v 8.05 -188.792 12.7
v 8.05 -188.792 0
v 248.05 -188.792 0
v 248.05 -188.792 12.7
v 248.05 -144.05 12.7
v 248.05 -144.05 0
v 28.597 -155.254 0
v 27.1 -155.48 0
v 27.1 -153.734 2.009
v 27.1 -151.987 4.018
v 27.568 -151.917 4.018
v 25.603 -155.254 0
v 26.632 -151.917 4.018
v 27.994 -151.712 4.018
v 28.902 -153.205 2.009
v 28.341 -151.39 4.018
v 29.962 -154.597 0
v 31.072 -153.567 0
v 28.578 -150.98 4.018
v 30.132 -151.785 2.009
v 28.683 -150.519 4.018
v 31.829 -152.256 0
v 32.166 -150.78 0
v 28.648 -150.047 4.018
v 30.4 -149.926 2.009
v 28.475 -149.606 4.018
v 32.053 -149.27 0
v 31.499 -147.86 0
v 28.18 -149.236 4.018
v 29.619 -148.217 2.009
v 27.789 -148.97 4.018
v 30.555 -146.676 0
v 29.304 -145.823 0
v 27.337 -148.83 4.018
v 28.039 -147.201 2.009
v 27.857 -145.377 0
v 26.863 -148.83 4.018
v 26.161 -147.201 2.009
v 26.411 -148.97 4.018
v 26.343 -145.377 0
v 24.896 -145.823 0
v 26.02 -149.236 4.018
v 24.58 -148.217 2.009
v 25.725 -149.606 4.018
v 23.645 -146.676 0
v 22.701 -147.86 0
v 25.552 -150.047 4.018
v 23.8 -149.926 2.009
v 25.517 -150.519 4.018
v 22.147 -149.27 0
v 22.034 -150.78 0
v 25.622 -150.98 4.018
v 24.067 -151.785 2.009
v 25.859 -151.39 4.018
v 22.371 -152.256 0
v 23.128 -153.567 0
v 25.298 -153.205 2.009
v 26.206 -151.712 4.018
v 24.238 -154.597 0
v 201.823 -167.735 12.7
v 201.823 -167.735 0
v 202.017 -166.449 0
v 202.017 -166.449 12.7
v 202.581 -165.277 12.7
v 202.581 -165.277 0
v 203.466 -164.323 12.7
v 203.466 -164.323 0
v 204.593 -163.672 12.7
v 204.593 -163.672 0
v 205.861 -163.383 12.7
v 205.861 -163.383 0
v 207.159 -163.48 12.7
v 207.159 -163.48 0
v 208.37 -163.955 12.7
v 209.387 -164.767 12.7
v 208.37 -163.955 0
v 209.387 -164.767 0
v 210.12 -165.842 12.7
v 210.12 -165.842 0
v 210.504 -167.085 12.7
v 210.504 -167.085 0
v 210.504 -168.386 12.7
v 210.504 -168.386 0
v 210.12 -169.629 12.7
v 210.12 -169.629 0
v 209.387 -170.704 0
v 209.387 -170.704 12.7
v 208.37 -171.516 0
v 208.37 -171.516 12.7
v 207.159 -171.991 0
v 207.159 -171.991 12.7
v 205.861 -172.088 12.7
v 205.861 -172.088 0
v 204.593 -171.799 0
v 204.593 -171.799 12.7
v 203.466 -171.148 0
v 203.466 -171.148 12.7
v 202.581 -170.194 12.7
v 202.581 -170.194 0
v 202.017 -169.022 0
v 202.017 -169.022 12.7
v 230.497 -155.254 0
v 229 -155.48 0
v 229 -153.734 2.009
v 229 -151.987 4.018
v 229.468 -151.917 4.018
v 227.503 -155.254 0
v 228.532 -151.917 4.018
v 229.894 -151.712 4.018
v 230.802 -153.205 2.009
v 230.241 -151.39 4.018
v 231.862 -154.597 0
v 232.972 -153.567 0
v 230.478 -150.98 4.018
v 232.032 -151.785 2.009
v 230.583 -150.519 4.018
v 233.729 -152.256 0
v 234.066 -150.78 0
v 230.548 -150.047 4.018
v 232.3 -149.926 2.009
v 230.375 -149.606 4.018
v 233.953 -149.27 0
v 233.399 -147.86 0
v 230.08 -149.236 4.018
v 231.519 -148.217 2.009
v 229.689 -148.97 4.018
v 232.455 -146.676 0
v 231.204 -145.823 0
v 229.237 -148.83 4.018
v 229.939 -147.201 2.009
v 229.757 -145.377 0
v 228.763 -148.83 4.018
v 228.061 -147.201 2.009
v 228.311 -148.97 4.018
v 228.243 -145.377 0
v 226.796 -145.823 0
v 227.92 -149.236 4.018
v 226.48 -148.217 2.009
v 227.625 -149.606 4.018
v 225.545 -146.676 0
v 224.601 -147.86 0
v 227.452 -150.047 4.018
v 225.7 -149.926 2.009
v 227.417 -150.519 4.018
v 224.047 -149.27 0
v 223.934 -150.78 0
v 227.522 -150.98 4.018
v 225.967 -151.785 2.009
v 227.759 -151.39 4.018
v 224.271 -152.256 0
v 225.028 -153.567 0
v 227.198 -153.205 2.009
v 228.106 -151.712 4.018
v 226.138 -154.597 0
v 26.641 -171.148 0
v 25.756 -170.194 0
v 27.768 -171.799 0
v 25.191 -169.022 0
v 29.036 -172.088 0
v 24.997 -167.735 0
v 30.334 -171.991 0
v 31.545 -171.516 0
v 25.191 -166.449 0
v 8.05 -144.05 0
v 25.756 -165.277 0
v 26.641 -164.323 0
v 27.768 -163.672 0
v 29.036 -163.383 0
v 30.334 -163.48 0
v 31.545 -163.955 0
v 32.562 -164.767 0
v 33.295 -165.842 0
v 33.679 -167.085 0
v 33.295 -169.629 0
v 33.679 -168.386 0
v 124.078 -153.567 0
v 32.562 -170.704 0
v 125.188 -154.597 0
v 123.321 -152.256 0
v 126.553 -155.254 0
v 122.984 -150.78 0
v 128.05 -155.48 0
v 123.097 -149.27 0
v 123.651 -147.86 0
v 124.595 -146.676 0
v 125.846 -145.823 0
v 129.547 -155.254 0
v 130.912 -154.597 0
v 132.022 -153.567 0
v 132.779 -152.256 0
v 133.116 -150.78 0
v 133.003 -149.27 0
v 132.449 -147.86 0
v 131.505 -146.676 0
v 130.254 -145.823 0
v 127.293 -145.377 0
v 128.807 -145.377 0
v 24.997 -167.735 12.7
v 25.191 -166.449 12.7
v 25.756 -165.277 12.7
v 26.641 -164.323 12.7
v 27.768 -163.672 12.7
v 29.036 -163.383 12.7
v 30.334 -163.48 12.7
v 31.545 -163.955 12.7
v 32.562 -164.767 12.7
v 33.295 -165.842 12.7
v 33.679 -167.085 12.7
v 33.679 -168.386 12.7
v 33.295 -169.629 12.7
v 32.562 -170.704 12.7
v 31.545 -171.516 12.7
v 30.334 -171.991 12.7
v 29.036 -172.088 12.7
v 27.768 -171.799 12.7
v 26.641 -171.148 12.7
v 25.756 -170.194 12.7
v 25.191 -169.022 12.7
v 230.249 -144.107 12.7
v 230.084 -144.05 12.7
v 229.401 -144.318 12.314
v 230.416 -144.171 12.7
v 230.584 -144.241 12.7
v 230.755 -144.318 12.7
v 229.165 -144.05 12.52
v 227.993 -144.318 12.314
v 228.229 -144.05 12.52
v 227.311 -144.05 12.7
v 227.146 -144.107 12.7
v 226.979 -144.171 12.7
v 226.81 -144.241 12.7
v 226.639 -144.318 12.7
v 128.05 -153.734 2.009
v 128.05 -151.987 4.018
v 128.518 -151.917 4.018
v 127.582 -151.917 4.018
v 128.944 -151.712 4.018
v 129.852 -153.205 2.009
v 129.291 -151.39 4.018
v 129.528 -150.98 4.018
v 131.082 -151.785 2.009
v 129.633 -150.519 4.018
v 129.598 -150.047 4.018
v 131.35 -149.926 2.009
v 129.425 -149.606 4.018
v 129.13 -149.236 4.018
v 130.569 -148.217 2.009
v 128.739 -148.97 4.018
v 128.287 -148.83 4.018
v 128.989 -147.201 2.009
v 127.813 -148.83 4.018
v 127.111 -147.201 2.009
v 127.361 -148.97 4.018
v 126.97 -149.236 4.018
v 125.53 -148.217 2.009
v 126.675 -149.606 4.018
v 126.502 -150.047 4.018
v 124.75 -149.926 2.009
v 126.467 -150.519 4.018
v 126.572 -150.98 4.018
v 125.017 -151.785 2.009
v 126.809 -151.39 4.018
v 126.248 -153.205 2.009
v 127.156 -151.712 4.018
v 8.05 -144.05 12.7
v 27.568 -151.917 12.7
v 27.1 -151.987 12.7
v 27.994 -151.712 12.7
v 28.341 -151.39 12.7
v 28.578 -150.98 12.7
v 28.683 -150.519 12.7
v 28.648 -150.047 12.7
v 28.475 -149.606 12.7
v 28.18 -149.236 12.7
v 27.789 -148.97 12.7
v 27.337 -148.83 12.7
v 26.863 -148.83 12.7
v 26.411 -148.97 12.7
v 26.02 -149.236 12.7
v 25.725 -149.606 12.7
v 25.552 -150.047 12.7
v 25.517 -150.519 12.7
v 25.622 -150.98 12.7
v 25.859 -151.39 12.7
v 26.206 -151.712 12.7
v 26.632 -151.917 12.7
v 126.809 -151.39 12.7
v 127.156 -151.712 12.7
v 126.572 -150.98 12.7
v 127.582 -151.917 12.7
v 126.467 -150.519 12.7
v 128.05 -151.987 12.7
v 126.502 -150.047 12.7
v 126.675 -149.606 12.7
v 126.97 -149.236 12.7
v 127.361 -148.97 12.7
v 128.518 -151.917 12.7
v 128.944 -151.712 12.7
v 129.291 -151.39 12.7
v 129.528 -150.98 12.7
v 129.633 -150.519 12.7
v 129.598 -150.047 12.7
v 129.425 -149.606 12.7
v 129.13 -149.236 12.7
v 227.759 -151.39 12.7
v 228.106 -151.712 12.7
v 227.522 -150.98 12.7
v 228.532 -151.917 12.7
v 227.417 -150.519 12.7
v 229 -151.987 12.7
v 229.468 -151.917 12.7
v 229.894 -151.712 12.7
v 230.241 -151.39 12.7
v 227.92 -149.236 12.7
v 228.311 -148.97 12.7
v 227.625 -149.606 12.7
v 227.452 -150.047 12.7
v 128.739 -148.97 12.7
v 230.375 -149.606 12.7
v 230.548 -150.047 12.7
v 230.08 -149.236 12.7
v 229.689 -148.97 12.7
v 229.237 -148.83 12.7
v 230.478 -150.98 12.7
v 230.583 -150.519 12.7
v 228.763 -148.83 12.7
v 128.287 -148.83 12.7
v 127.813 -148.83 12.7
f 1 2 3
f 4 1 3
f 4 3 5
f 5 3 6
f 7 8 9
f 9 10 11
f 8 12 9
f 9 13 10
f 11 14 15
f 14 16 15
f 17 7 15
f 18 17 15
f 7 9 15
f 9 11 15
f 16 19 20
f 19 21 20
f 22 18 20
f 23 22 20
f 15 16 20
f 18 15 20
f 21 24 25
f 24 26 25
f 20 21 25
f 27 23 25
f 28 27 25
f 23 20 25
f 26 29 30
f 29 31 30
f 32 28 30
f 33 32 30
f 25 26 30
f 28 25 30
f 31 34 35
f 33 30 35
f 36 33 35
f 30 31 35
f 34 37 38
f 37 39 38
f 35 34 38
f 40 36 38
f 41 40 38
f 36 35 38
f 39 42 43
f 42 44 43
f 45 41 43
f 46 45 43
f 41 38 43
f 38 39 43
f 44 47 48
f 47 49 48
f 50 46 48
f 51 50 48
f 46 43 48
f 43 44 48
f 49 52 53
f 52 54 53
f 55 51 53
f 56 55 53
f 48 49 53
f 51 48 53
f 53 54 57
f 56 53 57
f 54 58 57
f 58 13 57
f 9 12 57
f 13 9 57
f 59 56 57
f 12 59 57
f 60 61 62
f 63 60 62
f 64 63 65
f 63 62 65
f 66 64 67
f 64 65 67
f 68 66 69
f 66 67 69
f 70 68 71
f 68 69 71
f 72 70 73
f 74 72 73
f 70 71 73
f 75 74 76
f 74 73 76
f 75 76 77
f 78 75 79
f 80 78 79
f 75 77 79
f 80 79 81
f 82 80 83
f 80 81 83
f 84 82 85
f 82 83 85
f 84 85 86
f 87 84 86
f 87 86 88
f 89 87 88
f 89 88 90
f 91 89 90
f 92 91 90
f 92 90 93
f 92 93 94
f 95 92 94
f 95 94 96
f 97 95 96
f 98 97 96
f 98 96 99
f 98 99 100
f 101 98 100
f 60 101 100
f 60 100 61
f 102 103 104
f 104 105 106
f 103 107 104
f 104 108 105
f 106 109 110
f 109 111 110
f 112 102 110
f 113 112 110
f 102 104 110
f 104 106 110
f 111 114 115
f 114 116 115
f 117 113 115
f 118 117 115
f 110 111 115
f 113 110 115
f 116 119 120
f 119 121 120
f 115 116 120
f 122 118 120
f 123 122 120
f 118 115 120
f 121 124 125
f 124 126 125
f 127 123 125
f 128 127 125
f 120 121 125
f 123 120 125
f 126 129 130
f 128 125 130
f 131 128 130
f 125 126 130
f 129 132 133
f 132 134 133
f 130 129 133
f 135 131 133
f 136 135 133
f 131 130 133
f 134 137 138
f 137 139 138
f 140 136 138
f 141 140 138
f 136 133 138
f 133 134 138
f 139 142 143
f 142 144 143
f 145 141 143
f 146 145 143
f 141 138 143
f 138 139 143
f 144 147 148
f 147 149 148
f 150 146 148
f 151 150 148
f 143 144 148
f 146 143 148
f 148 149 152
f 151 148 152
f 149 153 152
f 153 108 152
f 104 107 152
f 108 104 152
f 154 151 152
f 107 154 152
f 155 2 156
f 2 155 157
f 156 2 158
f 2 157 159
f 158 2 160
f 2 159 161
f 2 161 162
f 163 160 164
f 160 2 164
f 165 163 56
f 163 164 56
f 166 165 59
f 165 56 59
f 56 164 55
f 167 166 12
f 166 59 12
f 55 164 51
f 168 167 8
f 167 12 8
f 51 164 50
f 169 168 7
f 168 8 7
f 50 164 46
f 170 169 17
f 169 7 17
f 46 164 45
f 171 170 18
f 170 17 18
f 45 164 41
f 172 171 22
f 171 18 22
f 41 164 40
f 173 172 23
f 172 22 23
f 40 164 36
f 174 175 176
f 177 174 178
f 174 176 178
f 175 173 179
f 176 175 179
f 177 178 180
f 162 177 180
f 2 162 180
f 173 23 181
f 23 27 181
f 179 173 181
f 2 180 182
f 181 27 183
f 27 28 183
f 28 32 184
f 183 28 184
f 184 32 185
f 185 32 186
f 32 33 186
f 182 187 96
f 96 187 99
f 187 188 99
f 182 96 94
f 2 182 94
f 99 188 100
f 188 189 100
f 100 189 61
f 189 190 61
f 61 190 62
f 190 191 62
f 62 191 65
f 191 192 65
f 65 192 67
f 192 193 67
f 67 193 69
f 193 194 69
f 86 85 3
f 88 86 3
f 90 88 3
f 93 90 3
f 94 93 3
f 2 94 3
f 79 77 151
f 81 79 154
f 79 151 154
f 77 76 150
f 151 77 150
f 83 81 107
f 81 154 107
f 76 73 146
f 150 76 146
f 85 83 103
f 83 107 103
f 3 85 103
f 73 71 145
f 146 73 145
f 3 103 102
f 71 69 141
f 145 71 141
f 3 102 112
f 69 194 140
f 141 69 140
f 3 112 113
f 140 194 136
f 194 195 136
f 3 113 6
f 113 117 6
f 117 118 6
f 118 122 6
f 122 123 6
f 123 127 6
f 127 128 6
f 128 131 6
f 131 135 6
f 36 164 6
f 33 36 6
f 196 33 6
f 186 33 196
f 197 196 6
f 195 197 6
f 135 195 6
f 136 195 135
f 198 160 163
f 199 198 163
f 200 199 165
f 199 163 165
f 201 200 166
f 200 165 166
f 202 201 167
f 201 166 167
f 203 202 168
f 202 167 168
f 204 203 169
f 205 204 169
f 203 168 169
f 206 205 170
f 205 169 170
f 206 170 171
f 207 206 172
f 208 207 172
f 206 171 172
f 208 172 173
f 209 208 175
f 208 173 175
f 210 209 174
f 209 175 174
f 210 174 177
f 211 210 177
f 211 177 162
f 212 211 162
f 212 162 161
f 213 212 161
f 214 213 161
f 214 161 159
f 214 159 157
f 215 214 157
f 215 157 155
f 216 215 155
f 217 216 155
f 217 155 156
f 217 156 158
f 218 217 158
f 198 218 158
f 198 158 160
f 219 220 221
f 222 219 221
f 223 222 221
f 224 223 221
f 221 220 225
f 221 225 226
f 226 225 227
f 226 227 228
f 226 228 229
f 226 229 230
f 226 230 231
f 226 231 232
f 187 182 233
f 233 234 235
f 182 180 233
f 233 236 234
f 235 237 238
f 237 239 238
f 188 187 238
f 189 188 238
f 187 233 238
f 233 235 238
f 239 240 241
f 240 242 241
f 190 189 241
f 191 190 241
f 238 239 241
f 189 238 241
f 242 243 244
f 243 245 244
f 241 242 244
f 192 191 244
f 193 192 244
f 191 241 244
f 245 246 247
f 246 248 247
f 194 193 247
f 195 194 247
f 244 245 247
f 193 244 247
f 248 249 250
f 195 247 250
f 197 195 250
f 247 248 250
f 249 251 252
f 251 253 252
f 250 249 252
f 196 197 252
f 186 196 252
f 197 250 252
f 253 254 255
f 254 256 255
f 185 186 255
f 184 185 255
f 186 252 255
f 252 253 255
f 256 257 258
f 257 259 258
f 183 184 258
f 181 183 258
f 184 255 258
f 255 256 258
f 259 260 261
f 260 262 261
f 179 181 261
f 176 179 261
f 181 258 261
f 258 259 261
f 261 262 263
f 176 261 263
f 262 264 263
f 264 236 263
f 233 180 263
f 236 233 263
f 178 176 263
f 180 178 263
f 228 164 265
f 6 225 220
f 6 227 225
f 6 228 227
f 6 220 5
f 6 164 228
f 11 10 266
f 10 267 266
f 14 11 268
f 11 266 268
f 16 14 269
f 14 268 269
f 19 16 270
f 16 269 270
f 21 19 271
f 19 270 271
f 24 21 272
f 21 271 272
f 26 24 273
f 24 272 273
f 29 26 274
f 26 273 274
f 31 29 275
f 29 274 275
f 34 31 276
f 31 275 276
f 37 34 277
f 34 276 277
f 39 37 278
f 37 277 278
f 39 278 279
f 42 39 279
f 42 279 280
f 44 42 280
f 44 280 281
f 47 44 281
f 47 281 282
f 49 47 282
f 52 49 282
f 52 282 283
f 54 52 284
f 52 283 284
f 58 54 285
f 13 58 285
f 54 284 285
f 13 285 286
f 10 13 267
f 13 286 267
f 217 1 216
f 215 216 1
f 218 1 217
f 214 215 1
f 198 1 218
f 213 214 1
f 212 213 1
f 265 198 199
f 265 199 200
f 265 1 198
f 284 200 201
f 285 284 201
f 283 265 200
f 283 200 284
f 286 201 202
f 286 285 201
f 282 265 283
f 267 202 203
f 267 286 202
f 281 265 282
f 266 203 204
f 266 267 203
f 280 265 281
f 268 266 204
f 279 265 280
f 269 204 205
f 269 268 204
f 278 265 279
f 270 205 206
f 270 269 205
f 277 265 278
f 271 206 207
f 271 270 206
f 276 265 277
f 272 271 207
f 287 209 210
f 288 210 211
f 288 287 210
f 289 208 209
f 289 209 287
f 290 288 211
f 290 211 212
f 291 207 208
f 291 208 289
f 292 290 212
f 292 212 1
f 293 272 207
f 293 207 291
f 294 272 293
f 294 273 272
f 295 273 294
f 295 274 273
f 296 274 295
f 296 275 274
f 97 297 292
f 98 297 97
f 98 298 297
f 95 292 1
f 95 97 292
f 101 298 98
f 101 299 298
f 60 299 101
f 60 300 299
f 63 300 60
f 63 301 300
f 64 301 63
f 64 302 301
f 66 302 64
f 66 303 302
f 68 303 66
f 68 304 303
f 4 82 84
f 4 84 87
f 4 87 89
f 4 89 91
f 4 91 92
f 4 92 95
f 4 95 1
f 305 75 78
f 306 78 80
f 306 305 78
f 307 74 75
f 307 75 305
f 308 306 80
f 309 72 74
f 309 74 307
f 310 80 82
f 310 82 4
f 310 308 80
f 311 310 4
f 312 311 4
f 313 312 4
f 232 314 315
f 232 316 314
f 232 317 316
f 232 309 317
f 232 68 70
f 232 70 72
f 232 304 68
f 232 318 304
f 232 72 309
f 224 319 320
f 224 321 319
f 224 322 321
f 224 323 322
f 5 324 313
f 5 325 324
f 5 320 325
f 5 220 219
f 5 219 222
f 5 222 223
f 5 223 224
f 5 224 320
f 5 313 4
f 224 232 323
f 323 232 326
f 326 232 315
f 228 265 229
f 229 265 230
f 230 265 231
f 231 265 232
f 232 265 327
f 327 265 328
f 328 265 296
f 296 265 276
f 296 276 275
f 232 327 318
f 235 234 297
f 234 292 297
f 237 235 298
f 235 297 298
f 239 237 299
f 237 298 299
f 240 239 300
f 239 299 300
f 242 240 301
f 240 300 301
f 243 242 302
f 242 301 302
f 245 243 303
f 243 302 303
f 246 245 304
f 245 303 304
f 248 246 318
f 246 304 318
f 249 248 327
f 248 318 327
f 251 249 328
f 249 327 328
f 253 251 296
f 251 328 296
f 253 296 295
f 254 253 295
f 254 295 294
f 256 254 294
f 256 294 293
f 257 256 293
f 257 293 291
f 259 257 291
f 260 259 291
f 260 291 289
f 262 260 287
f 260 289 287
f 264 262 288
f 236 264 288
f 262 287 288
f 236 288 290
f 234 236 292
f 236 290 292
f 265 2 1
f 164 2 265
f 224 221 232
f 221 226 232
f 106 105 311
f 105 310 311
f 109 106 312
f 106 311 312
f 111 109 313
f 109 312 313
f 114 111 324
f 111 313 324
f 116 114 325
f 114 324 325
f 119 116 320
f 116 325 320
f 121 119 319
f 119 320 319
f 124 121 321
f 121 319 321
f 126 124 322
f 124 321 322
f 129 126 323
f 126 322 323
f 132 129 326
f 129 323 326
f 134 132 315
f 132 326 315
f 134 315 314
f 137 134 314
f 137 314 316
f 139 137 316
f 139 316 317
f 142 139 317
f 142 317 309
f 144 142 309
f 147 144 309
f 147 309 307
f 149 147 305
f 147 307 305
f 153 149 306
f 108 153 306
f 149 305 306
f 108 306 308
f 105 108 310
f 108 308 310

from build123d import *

# Parameters (mm, degrees)
SKETCH1_W                = 240
SKETCH1_H                = 44.741741382
BOSS_EXTRUDE1_DEPTH      = 12.7
HOLE1_D                  = 3.175
HOLE1_DEPTH              = 38.1
HOLE1_CSINK_D            = 10.16
HOLE1_CSINK_ANGLE        = 82
HOLE1_TIP                = 0.953866233
F_5_16_CLEARANCE_HOLE1_D = 8.72998


# Read off the part's stored shape, not the designer's step: Hole2
with BuildPart() as part:
    # Sketch1 → Boss-Extrude1 (new body)
    with BuildSketch(Plane.XY):
        with Locations((128.049945057, -166.420870685)):
            Rectangle(SKETCH1_W, SKETCH1_H)
    extrude(amount=BOSS_EXTRUDE1_DEPTH)

    # Hole1
    with Locations(Plane(origin=(-1072.859770441, -52.974999997, 0), x_dir=(0, 1, 0), z_dir=(0, 0, -1))):
        with Locations((-97.424999997, 1099.959715498), (-97.424999997, 1301.859715498), (-97.424999997, 1200.909715498)):
            CounterSinkHole(HOLE1_D / 2, HOLE1_CSINK_D / 2, depth=HOLE1_DEPTH, counter_sink_angle=HOLE1_CSINK_ANGLE)
            with Locations((0, 0, -(HOLE1_DEPTH + HOLE1_TIP / 2))):  # 118° drill point
                Cone(0, HOLE1_D / 2, HOLE1_TIP, mode=Mode.SUBTRACT)

    # Hole2 outline → Hole2 (revolve, cut)
    with BuildSketch(Plane(origin=(228.697300635, 0, 17.344544827), x_dir=(1, 0, 0), z_dir=(0, 0, 1))):
        Polygon((4.644544827, -144.049999968), (4.644544827, -144.317952856), (5.080000174, -144.317952756), (4.847072326, -144.049999968), align=None)
    revolve(axis=Axis((228.697300635, 0, 17.344544827), (0, 1, 0)), mode=Mode.SUBTRACT)

    # 5/16 Clearance Hole1 (through all)
    with Locations(Plane.XY.offset(12.7)):
        with Locations((29.3624, -167.735499994), (206.1876, -167.735499994)):
            Hole(F_5_16_CLEARANCE_HOLE1_D / 2)


solid = part.part
